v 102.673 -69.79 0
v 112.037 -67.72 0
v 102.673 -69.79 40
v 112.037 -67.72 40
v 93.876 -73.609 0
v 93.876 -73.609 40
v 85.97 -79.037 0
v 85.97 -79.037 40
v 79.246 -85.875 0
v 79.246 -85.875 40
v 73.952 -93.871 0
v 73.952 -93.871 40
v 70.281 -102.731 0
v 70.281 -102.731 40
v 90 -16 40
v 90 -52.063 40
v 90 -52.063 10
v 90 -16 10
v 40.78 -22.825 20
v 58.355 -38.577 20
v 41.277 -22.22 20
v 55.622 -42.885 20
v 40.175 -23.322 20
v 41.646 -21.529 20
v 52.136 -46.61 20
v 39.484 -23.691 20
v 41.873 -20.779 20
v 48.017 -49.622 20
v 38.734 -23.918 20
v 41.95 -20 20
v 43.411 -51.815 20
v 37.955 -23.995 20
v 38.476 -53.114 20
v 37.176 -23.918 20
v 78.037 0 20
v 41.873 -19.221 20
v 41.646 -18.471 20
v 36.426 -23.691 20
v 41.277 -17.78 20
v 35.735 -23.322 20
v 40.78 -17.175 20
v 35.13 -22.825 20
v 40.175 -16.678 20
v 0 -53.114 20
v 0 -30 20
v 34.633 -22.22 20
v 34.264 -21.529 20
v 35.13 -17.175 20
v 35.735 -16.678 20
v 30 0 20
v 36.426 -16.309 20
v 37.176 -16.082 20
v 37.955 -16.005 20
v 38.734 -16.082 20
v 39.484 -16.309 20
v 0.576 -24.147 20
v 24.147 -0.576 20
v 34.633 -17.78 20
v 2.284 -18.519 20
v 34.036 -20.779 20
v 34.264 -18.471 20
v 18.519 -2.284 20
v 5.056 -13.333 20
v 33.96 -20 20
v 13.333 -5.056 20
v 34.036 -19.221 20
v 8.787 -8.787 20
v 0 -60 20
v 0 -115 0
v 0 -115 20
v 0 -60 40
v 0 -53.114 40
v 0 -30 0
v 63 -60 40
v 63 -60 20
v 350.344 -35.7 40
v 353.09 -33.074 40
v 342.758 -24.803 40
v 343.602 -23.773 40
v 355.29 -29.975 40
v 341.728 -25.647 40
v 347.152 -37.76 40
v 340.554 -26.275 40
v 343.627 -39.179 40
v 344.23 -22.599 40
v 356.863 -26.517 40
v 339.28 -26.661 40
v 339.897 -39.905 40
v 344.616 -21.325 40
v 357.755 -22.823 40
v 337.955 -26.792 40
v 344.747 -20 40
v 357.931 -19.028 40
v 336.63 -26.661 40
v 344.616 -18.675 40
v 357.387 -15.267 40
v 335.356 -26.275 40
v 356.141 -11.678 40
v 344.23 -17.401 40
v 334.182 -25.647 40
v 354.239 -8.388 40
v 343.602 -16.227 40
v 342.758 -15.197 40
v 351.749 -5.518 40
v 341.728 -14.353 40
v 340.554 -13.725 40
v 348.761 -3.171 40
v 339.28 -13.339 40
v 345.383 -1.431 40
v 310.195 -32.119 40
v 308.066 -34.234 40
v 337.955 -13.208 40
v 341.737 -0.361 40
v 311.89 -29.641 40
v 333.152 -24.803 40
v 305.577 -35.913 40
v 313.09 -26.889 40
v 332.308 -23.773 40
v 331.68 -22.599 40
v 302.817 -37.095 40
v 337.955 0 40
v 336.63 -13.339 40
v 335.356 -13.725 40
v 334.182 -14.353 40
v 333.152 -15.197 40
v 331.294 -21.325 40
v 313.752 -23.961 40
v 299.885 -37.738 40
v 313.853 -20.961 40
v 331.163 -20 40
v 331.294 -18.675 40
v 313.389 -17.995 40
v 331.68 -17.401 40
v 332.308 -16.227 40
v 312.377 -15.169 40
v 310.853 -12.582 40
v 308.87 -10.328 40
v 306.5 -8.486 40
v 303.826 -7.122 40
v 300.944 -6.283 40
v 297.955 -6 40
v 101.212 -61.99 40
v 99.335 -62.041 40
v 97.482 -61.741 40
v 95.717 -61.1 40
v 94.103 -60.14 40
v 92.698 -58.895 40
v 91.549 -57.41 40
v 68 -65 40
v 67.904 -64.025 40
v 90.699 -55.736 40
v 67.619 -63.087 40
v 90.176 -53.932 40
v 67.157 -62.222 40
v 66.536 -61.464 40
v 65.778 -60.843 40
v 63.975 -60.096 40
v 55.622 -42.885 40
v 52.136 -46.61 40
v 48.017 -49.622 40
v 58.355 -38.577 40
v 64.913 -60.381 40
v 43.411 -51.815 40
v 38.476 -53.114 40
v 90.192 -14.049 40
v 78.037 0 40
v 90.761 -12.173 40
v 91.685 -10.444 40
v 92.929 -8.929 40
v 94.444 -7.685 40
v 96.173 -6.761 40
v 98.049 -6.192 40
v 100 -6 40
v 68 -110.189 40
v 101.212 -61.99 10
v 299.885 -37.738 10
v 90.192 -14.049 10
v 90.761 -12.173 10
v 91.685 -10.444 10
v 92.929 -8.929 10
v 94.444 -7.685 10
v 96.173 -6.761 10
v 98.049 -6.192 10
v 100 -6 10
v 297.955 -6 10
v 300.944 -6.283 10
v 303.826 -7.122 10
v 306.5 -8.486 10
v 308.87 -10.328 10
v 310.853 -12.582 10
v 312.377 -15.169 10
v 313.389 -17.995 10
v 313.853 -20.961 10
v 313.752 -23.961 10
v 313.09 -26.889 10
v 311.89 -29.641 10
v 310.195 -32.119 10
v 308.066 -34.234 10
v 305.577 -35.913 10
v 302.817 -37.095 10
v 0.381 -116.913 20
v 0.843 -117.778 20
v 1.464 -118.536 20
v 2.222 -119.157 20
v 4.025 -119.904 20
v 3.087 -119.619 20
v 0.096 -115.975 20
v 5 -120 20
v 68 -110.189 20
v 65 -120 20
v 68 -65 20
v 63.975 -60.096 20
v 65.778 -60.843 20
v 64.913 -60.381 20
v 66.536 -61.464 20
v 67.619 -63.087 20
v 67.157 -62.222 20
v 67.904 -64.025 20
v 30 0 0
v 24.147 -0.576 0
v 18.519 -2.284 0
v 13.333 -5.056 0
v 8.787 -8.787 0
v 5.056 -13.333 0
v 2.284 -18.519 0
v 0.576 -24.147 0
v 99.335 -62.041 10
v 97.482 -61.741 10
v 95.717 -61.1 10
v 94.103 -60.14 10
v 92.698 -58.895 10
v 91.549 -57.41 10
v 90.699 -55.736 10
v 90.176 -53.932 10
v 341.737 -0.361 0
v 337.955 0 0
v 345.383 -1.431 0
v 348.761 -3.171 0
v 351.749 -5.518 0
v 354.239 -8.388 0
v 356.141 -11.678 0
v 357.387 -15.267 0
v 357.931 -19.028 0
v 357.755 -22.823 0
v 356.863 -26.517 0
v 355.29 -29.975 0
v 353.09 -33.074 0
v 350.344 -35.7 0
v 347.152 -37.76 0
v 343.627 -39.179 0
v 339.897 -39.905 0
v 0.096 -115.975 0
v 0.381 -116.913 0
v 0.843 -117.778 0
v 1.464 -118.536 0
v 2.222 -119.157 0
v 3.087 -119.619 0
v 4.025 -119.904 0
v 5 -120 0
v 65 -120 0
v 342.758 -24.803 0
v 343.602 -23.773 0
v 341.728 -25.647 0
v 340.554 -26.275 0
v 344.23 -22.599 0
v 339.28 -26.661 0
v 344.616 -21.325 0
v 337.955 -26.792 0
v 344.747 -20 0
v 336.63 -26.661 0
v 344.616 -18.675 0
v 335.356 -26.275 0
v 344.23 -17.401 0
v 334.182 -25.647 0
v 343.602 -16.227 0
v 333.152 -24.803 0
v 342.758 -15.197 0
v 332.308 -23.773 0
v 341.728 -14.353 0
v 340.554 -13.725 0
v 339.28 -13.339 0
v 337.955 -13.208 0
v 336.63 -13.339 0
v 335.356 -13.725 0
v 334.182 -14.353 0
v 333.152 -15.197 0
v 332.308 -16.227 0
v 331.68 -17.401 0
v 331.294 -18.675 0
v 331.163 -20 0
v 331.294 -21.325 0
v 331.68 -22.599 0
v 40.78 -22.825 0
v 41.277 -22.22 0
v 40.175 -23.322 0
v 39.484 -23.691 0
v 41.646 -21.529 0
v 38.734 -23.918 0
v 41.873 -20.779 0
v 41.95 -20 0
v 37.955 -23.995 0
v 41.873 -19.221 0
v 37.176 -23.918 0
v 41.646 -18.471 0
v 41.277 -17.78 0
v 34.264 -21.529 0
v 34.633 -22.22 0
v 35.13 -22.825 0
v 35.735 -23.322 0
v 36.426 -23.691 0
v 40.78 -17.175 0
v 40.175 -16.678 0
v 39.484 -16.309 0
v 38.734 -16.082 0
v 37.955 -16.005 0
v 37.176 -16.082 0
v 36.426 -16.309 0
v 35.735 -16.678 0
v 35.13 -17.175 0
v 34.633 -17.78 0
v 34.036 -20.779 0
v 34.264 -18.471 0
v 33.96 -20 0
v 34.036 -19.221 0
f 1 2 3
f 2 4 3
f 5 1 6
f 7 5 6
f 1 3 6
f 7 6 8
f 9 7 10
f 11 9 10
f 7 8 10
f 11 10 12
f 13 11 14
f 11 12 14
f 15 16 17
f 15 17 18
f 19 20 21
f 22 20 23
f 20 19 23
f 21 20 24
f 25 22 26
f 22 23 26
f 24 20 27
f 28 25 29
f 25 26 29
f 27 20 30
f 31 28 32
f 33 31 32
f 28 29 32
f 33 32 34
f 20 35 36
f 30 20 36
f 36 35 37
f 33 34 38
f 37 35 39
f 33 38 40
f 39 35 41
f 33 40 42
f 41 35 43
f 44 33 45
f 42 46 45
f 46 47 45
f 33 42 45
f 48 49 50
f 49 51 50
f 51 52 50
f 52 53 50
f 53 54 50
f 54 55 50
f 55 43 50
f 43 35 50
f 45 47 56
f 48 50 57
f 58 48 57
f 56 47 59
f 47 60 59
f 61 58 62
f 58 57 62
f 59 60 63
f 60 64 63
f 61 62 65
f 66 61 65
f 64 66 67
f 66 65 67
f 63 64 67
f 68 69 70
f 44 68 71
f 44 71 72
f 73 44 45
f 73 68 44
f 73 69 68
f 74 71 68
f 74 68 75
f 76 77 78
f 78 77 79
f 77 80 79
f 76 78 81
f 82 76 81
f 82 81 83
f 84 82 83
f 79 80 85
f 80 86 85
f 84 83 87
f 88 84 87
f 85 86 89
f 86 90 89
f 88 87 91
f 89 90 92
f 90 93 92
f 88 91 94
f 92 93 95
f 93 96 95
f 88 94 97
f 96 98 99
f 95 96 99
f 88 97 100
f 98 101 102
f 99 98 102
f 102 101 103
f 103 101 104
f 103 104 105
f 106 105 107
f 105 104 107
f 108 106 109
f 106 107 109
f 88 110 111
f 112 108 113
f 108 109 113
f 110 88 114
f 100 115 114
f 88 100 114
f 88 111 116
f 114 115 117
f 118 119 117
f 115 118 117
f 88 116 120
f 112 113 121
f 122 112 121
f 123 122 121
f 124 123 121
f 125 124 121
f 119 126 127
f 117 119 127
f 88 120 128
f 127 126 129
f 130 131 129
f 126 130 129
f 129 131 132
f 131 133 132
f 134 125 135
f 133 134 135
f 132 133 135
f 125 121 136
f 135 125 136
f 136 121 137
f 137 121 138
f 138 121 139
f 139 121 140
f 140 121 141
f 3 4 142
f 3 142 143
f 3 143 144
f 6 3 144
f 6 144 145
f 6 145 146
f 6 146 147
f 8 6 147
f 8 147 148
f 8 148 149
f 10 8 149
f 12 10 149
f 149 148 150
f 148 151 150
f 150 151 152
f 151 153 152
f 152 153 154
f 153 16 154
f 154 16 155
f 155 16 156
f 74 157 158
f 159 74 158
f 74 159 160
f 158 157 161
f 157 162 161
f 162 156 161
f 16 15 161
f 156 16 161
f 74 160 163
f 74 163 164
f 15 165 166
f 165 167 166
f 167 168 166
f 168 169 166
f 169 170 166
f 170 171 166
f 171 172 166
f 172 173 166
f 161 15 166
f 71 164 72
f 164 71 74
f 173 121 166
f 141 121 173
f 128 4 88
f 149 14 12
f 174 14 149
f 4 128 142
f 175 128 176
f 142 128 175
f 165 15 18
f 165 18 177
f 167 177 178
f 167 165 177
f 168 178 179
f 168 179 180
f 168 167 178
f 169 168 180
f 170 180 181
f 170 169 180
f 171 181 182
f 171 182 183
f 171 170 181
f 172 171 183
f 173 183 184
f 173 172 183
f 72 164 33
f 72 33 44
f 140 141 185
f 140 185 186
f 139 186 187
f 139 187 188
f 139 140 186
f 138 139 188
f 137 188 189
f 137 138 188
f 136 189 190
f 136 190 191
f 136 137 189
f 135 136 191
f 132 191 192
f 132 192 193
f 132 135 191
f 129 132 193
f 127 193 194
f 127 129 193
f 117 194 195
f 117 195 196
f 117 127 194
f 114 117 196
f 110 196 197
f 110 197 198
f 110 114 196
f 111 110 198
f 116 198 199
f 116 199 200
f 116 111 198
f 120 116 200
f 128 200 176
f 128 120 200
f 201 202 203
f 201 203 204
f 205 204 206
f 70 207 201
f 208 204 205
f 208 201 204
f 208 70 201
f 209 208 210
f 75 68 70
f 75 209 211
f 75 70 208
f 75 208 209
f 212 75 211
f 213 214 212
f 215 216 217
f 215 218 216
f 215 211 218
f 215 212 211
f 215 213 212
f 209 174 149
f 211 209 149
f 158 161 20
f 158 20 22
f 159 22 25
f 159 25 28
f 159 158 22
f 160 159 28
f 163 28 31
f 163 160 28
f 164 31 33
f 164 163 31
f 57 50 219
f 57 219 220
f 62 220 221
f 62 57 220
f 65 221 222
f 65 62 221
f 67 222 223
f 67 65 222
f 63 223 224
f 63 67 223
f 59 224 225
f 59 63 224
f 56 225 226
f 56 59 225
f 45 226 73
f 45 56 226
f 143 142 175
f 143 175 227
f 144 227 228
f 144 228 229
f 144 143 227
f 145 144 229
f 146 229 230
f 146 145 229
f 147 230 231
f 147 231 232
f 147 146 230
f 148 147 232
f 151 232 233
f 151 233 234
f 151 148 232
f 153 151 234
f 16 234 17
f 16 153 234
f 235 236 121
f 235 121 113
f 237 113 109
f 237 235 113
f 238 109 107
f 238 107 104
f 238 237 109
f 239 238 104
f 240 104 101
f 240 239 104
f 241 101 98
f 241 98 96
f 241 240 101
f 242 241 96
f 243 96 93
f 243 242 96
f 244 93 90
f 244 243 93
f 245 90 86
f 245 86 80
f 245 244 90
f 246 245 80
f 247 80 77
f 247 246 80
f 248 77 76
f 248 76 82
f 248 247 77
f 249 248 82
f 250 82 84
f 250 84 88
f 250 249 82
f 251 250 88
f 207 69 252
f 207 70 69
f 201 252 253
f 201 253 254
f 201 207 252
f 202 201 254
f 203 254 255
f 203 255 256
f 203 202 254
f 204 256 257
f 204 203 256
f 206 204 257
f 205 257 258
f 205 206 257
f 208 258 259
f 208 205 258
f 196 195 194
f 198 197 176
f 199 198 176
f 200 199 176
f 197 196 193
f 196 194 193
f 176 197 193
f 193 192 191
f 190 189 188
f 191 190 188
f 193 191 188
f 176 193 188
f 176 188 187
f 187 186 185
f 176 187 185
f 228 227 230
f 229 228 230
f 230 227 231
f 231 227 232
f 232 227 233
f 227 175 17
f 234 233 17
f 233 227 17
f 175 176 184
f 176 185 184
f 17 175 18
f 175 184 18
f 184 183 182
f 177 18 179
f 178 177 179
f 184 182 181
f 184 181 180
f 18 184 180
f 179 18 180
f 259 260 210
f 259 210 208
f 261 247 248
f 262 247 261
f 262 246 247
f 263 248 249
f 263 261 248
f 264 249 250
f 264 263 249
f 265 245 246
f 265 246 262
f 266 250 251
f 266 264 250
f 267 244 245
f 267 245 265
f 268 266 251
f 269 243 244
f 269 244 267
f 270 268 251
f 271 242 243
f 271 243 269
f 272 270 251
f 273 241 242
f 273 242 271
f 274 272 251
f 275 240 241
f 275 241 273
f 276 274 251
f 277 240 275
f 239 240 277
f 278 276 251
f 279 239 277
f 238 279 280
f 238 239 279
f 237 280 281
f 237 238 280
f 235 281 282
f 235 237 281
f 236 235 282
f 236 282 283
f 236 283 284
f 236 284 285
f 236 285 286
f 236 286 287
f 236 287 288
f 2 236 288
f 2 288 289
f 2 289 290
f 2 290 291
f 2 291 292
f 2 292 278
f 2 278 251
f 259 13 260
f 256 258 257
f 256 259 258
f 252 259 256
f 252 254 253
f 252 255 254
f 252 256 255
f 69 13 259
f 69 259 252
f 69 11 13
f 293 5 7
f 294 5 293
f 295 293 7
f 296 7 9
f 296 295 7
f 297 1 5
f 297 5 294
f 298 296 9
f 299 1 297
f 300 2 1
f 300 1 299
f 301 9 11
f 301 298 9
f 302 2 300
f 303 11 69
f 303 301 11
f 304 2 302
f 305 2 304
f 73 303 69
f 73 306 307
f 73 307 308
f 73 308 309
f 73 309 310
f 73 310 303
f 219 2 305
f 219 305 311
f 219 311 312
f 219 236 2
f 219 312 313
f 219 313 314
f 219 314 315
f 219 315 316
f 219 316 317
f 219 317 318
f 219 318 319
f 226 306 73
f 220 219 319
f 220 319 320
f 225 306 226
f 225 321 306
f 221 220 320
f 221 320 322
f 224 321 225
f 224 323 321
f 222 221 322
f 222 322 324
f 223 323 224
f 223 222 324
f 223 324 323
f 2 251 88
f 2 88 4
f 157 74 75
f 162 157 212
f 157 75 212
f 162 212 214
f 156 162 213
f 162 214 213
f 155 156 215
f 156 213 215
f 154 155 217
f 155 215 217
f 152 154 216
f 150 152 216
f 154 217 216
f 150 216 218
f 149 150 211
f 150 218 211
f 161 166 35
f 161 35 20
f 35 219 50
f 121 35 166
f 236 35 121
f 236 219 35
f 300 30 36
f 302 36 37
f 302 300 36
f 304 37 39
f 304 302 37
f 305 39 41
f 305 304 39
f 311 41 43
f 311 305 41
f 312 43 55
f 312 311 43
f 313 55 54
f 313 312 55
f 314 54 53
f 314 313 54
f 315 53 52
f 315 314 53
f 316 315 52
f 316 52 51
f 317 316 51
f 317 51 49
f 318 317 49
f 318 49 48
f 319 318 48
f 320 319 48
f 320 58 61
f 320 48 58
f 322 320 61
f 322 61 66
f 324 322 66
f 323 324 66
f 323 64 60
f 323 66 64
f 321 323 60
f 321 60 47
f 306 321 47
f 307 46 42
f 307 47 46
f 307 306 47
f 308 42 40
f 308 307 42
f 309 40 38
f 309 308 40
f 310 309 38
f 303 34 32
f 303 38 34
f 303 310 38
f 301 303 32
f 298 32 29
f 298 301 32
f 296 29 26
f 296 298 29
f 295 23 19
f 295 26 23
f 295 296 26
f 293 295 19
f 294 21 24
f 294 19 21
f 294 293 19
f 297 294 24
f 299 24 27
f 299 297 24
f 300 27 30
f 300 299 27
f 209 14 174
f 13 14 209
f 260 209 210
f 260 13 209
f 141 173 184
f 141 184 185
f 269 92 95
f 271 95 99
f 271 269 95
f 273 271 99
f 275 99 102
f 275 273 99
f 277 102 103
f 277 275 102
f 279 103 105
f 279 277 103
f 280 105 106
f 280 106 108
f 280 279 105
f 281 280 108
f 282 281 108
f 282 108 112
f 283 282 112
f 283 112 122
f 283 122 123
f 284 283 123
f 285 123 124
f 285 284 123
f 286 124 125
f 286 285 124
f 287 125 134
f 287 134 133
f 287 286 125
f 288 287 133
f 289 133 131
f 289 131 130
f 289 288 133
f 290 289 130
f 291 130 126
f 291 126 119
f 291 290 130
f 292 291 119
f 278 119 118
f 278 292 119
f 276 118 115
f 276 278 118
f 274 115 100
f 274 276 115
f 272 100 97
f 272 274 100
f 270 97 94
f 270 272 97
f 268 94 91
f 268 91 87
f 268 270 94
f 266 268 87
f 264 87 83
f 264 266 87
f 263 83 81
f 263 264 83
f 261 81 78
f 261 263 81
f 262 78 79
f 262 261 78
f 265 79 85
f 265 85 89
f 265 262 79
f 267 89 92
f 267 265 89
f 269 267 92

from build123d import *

# Parameters (mm, degrees)
SKETCH_1_R          = 6.791944052
SKETCH_1_R_2        = 3.995261207
EXTRUDE_1_DEPTH     = 40
CUT_EXTRUDE_1_DEPTH = 30
FILLET_1_R          = 50
SKETCH_3_W          = 68
SKETCH_3_H          = 60
CUT_EXTRUDE_2_DEPTH = 20
FILLET_2_R          = 30
FILLET_3_R          = 5
FILLET_4_R          = 5
CUT_EXTRUDE_3_DEPTH = 20


with BuildPart() as part:
    # ｽｹｯﾁ1 → ﾎﾞｽ - 押し出し1 (new body)
    with BuildSketch(Plane.XY):
        with BuildLine():
            Line((0, 0), (337.95498147, 0))
            ThreePointArc((337.95498147, 0), (357.931338385, -19.027804338), (339.897074223, -39.90548356))
            Line((339.897074223, -39.90548356), (79.782466467, -71.657339391))
            Line((79.782466467, -71.657339391), (65, -120))
            Line((65, -120), (0, -120))
            Line((0, -120), (0, 0))
        make_face()
        with Locations((337.95498147, -20)):
            Circle(SKETCH_1_R, mode=Mode.SUBTRACT)
        with Locations((37.95498147, -20)):
            Circle(SKETCH_1_R_2, mode=Mode.SUBTRACT)
    extrude(amount=EXTRUDE_1_DEPTH)

    # ｽｹｯﾁ2 → ｶｯﾄ - 押し出し1 (cut)
    with BuildSketch(Plane.XY.offset(40)):
        with BuildLine():
            Line((100, -6), (297.95498147, -6))
            ThreePointArc((297.95498147, -6), (313.853171972, -20.960808871), (299.884912284, -37.737756884))
            Line((299.884912284, -37.737756884), (101.211692948, -61.989541405))
            ThreePointArc((101.211692948, -61.989541405), (93.37115883, -59.550442937), (90, -52.063222842))
            Line((90, -52.063222842), (90, -16))
            ThreePointArc((90, -16), (92.928932188, -8.928932188), (100, -6))
        make_face()
    extrude(amount=-CUT_EXTRUDE_1_DEPTH, mode=Mode.SUBTRACT)

    # ﾌｨﾚｯﾄ1
    fillet_1_edges = [part.edges().sort_by_distance(p)[0] for p in [
        (79.782466467, -71.657339391, 20),
    ]]
    fillet(fillet_1_edges, radius=FILLET_1_R)

    # ｽｹｯﾁ3 → ｶｯﾄ - 押し出し2 (cut)
    with BuildSketch(Plane.XY.offset(40)):
        with Locations((34, -90)):
            Rectangle(SKETCH_3_W, SKETCH_3_H)
    extrude(amount=-CUT_EXTRUDE_2_DEPTH, mode=Mode.SUBTRACT)

    # ﾌｨﾚｯﾄ2
    fillet_2_edges = [part.edges().sort_by_distance(p)[0] for p in [
        (0, 0, 20),
    ]]
    fillet(fillet_2_edges, radius=FILLET_2_R)

    # ﾌｨﾚｯﾄ3
    fillet_3_edges = [part.edges().sort_by_distance(p)[0] for p in [
        (68, -60, 30),
    ]]
    fillet(fillet_3_edges, radius=FILLET_3_R)

    # ﾌｨﾚｯﾄ4
    fillet_4_edges = [part.edges().sort_by_distance(p)[0] for p in [
        (0, -120, 10),
    ]]
    fillet(fillet_4_edges, radius=FILLET_4_R)

    # ｽｹｯﾁ4 → ｶｯﾄ - 押し出し3 (cut)
    with BuildSketch(Plane.XY.offset(40)):
        with BuildLine():
            Line((78.036982516, 0), (58.355302576, -38.576774086))
            ThreePointArc((58.355302576, -38.576774086), (50.146919618, -48.212517196), (38.476348343, -53.113829488))
            Line((38.476348343, -53.113829488), (0, -53.113829488))
            Line((0, -53.113829488), (0, 0))
            Line((0, 0), (78.036982516, 0))
        make_face()
    extrude(amount=-CUT_EXTRUDE_3_DEPTH, mode=Mode.SUBTRACT)


solid = part.part
